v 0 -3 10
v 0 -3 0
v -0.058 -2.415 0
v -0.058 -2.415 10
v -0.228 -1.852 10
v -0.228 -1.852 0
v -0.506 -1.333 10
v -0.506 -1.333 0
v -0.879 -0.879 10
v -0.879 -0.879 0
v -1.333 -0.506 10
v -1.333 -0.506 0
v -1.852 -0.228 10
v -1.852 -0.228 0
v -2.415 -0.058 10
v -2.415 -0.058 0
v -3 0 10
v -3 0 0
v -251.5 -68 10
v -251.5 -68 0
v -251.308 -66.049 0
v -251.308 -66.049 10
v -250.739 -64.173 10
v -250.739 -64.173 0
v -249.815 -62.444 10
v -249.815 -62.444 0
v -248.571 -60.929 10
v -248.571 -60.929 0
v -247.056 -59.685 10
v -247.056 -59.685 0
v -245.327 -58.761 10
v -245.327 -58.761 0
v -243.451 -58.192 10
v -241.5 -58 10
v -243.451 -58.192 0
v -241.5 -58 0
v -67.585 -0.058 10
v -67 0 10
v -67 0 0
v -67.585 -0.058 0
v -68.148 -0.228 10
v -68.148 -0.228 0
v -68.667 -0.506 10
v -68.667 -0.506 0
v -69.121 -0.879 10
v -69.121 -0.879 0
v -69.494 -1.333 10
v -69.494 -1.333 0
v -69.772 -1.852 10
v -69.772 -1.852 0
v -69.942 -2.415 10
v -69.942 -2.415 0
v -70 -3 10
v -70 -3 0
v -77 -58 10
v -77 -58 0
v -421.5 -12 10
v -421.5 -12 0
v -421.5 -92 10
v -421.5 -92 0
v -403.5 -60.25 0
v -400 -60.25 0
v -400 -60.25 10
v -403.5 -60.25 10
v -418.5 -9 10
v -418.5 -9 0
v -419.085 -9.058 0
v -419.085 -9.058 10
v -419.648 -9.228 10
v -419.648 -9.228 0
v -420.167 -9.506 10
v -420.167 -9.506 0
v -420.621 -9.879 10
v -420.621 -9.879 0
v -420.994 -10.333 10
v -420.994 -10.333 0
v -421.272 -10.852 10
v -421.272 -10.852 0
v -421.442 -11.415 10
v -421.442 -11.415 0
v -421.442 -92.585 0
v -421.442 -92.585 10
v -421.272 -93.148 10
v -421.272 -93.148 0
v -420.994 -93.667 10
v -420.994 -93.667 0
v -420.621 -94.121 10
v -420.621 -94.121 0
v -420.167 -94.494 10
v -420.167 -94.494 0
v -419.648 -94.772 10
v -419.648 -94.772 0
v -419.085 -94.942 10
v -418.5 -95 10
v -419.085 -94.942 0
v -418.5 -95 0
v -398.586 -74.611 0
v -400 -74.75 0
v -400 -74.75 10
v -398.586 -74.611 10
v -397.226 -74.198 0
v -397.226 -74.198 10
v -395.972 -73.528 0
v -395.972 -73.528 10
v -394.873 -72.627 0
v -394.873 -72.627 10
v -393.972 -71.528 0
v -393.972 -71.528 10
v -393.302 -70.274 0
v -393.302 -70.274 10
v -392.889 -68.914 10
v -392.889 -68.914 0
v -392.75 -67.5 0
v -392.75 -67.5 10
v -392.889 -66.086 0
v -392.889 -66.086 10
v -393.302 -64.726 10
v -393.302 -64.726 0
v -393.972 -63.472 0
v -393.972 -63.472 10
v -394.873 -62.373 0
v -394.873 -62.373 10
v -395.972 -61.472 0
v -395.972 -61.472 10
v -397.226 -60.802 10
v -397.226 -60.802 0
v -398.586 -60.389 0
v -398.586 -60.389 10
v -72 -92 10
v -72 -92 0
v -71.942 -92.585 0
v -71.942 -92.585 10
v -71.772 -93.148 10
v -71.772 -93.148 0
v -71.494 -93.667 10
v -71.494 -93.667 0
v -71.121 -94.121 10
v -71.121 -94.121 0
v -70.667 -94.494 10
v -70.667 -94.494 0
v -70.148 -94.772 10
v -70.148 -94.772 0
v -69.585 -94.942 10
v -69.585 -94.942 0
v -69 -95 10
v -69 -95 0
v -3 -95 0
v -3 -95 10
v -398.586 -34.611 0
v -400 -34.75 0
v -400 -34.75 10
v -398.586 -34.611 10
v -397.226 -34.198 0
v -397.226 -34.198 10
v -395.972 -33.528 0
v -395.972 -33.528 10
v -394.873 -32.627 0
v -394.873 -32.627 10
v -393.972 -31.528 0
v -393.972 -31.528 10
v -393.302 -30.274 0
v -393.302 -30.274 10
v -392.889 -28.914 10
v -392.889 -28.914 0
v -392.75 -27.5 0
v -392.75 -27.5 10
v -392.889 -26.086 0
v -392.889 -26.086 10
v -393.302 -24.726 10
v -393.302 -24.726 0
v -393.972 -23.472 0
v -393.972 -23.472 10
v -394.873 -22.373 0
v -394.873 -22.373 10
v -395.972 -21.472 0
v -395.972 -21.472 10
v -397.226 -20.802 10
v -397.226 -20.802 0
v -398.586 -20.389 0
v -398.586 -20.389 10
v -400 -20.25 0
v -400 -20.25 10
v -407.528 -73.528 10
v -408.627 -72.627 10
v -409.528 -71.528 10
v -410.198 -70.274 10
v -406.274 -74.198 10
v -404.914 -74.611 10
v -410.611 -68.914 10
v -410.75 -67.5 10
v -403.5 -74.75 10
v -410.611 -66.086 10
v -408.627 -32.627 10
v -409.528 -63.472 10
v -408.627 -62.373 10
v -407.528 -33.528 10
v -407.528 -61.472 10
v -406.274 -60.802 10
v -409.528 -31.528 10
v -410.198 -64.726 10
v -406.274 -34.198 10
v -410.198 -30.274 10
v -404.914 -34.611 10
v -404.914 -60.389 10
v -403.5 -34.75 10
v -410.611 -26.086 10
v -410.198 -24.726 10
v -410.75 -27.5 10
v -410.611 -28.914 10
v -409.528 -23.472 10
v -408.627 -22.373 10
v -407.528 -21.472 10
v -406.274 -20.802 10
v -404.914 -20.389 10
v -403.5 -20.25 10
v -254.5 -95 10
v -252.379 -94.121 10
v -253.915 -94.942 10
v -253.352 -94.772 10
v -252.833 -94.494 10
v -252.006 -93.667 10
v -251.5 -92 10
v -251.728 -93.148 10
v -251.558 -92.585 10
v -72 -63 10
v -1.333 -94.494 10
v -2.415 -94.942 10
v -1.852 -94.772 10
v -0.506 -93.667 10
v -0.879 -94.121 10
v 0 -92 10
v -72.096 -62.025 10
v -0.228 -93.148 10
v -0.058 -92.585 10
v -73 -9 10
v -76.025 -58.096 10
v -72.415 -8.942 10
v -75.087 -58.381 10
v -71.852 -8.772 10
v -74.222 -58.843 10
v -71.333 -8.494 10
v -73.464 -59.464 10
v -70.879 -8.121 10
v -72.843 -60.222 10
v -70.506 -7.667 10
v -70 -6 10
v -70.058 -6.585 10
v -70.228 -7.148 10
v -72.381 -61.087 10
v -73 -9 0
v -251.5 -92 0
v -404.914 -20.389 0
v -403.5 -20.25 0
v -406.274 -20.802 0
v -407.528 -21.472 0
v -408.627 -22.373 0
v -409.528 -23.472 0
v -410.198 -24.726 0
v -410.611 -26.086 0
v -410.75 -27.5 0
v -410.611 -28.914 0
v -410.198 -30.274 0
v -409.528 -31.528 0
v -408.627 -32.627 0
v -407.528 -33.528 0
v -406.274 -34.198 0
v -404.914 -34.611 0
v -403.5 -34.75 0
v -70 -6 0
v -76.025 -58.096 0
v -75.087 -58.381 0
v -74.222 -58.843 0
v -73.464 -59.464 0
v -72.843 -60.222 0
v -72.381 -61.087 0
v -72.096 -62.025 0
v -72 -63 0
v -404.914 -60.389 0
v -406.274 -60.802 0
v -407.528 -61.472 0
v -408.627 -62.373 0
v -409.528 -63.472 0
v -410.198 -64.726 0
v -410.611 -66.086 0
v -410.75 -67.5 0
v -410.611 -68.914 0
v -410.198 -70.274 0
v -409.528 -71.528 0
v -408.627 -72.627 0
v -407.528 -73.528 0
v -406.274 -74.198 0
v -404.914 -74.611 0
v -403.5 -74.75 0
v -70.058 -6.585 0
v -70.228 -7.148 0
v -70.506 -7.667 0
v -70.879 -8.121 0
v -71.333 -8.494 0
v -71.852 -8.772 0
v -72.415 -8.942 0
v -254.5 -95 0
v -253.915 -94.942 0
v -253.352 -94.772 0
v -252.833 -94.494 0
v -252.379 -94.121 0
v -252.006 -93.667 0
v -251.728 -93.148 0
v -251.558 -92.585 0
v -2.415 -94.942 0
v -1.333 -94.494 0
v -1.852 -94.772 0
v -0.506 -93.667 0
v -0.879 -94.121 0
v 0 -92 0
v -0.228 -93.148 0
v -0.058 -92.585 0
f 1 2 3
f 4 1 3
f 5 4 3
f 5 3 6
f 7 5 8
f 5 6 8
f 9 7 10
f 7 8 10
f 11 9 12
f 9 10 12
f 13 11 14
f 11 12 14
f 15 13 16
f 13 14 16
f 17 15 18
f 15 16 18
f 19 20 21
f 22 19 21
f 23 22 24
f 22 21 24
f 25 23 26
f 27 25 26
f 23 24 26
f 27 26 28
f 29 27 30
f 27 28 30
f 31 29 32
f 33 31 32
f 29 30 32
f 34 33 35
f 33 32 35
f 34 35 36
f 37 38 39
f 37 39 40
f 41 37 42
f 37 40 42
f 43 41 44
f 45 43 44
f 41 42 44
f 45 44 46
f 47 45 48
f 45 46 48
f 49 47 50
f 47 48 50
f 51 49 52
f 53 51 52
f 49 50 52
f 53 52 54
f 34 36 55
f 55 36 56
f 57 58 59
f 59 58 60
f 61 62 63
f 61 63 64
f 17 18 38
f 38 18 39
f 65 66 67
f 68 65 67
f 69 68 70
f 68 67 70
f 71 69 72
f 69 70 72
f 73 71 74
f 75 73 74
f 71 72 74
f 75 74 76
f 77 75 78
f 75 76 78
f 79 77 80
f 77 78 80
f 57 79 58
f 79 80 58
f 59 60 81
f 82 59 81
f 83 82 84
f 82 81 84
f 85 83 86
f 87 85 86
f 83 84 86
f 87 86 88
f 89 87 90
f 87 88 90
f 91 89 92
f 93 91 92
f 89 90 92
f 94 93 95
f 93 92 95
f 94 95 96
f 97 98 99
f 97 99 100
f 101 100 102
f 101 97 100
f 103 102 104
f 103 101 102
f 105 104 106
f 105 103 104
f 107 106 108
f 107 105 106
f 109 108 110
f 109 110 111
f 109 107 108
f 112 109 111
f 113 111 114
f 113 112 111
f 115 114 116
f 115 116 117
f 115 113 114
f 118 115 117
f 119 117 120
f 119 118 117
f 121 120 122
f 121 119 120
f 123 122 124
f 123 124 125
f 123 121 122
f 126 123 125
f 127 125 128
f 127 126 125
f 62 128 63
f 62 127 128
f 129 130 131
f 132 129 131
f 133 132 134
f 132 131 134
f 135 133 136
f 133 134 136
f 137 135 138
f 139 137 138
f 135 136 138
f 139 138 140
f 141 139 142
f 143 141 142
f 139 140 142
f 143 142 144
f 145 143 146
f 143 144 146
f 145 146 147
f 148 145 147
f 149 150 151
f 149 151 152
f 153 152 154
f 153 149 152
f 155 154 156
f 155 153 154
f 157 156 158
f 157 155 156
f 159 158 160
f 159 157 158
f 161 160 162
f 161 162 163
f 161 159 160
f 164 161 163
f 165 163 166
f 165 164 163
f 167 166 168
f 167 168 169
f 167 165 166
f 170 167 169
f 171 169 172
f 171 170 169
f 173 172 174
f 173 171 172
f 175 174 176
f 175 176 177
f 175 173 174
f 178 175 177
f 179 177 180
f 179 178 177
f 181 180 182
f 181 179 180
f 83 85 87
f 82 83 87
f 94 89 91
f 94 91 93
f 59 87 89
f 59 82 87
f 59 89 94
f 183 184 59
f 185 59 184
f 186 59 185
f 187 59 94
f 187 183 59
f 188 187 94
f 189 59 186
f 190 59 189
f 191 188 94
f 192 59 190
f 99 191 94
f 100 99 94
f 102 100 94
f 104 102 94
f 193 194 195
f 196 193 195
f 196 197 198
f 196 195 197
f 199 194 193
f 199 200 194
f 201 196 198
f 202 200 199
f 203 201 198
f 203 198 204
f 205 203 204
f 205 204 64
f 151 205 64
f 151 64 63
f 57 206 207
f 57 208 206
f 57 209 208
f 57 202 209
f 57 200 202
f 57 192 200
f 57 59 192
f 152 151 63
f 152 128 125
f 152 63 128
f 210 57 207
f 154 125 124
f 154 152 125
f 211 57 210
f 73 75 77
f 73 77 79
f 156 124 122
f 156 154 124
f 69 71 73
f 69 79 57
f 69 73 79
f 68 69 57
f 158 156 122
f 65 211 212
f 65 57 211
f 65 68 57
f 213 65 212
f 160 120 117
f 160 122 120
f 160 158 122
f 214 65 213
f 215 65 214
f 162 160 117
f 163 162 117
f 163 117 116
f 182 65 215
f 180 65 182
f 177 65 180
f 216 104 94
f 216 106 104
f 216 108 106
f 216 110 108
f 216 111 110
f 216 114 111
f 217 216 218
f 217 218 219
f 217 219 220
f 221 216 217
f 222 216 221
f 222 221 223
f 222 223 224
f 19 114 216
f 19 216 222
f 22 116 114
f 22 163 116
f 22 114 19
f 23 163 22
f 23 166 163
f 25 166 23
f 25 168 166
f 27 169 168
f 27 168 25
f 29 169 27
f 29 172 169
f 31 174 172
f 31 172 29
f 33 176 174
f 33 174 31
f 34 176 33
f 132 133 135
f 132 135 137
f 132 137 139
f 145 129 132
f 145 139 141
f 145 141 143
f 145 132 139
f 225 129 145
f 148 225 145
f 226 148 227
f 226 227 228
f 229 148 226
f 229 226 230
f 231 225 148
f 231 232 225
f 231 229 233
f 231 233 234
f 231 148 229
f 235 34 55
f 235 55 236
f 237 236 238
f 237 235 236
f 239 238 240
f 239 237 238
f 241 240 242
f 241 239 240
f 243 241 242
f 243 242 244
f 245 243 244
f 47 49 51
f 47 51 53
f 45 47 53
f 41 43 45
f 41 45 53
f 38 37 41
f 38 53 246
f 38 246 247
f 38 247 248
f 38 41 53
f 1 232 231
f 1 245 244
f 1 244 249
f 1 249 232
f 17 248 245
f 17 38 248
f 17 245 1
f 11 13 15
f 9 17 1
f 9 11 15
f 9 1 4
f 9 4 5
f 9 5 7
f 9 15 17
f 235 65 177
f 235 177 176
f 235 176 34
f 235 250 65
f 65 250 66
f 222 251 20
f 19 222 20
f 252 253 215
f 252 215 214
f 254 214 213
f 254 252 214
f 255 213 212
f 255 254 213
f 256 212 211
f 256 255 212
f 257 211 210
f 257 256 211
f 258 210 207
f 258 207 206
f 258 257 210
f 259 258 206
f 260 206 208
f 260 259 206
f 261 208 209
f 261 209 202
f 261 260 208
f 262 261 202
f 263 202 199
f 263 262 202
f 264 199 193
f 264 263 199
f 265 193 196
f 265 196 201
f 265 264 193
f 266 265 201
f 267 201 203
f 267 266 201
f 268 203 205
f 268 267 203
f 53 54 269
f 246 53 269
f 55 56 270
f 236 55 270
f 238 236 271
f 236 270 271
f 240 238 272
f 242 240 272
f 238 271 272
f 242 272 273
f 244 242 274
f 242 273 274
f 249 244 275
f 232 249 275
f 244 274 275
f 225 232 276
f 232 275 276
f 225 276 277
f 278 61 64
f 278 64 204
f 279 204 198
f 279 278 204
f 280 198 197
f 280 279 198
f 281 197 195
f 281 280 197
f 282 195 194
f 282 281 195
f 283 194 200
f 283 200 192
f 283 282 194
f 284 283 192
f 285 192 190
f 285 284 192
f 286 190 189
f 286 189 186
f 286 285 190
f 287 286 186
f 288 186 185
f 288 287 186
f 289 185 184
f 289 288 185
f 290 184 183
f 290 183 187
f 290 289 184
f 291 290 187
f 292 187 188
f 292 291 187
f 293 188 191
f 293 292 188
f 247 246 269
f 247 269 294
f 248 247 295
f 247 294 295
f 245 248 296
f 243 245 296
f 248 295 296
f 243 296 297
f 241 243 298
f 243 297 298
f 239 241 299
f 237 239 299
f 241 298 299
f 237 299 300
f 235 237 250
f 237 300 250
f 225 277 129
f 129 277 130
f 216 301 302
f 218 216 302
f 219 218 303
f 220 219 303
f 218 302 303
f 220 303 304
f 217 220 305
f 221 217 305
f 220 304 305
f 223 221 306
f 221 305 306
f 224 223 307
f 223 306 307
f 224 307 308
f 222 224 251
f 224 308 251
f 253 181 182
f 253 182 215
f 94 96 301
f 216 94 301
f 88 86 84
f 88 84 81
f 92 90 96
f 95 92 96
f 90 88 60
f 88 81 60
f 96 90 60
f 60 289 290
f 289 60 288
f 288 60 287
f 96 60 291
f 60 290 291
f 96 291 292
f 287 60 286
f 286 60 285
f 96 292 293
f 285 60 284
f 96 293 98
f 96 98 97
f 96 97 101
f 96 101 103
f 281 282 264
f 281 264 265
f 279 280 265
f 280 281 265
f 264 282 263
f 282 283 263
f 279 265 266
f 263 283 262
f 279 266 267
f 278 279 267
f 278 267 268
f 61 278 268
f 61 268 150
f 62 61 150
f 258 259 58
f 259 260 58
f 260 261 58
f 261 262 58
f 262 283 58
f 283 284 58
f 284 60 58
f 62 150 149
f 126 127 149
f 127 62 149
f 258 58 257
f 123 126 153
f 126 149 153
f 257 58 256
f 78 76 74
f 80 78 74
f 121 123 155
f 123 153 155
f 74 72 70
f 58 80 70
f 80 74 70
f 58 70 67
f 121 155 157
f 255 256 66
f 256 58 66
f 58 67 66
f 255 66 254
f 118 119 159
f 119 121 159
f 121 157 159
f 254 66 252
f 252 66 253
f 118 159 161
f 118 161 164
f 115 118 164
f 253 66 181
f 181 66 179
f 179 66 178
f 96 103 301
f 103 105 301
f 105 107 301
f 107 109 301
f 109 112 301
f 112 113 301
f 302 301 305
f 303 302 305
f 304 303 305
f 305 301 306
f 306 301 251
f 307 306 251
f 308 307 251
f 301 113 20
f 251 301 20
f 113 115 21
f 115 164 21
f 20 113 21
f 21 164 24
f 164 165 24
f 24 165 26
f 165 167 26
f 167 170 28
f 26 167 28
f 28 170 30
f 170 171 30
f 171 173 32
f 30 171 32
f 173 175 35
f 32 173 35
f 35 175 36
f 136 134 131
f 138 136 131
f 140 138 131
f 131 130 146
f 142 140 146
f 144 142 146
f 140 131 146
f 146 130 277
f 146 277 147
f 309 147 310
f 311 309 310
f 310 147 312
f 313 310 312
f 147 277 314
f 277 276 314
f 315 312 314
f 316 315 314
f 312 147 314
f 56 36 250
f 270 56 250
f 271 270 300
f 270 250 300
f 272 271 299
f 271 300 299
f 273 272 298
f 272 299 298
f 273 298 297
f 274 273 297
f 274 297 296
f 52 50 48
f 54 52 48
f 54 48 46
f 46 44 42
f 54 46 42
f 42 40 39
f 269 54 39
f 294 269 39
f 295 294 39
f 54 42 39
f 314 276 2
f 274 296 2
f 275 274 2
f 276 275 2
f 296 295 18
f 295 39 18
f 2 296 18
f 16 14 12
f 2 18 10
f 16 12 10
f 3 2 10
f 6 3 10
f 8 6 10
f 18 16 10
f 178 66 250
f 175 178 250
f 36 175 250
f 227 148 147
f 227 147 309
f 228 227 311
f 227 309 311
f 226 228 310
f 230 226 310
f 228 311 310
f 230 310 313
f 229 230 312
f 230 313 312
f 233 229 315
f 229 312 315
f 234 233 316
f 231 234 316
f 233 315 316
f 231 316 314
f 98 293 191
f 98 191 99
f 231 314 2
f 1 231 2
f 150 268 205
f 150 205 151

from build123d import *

# Parameters (mm, degrees)
EXTRUDE1_DEPTH = 10


with BuildPart() as part:
    # Sketch1 → Extrude1 (new body)
    with BuildSketch(Plane.XY):
        with BuildLine():
            Line((-3, 0), (-67, 0))
            ThreePointArc((-67, 0), (-69.121320344, -0.878679656), (-70, -3))
            Line((-70, -3), (-70, -6))
            ThreePointArc((-70, -6), (-70.878679656, -8.121320344), (-73, -9))
            Line((-73, -9), (-418.5, -9))
            ThreePointArc((-418.5, -9), (-420.621320344, -9.878679656), (-421.5, -12))
            Line((-421.5, -12), (-421.5, -92))
            ThreePointArc((-421.5, -92), (-420.621320344, -94.121320344), (-418.5, -95))
            Line((-418.5, -95), (-254.5, -95))
            ThreePointArc((-254.5, -95), (-252.378679656, -94.121320344), (-251.5, -92))
            Line((-251.5, -92), (-251.5, -68))
            ThreePointArc((-251.5, -68), (-248.571067812, -60.928932188), (-241.5, -58))
            Line((-241.5, -58), (-77, -58))
            ThreePointArc((-77, -58), (-73.464466094, -59.464466094), (-72, -63))
            Line((-72, -63), (-72, -92))
            ThreePointArc((-72, -92), (-71.121320344, -94.121320344), (-69, -95))
            Line((-69, -95), (-3, -95))
            ThreePointArc((-3, -95), (-0.878679656, -94.121320344), (0, -92))
            Line((0, -92), (0, -3))
            ThreePointArc((0, -3), (-0.878679656, -0.878679656), (-3, 0))
        make_face()
        with BuildLine():
            Line((-403.5, -74.75), (-400, -74.75))
            ThreePointArc((-400, -74.75), (-392.75, -67.5), (-400, -60.25))
            Line((-400, -60.25), (-403.5, -60.25))
            ThreePointArc((-403.5, -60.25), (-410.75, -67.5), (-403.5, -74.75))
        make_face(mode=Mode.SUBTRACT)
        with BuildLine():
            Line((-403.5, -34.75), (-400, -34.75))
            ThreePointArc((-400, -34.75), (-392.75, -27.5), (-400, -20.25))
            Line((-400, -20.25), (-403.5, -20.25))
            ThreePointArc((-403.5, -20.25), (-410.75, -27.5), (-403.5, -34.75))
        make_face(mode=Mode.SUBTRACT)
    extrude(amount=EXTRUDE1_DEPTH)


solid = part.part
